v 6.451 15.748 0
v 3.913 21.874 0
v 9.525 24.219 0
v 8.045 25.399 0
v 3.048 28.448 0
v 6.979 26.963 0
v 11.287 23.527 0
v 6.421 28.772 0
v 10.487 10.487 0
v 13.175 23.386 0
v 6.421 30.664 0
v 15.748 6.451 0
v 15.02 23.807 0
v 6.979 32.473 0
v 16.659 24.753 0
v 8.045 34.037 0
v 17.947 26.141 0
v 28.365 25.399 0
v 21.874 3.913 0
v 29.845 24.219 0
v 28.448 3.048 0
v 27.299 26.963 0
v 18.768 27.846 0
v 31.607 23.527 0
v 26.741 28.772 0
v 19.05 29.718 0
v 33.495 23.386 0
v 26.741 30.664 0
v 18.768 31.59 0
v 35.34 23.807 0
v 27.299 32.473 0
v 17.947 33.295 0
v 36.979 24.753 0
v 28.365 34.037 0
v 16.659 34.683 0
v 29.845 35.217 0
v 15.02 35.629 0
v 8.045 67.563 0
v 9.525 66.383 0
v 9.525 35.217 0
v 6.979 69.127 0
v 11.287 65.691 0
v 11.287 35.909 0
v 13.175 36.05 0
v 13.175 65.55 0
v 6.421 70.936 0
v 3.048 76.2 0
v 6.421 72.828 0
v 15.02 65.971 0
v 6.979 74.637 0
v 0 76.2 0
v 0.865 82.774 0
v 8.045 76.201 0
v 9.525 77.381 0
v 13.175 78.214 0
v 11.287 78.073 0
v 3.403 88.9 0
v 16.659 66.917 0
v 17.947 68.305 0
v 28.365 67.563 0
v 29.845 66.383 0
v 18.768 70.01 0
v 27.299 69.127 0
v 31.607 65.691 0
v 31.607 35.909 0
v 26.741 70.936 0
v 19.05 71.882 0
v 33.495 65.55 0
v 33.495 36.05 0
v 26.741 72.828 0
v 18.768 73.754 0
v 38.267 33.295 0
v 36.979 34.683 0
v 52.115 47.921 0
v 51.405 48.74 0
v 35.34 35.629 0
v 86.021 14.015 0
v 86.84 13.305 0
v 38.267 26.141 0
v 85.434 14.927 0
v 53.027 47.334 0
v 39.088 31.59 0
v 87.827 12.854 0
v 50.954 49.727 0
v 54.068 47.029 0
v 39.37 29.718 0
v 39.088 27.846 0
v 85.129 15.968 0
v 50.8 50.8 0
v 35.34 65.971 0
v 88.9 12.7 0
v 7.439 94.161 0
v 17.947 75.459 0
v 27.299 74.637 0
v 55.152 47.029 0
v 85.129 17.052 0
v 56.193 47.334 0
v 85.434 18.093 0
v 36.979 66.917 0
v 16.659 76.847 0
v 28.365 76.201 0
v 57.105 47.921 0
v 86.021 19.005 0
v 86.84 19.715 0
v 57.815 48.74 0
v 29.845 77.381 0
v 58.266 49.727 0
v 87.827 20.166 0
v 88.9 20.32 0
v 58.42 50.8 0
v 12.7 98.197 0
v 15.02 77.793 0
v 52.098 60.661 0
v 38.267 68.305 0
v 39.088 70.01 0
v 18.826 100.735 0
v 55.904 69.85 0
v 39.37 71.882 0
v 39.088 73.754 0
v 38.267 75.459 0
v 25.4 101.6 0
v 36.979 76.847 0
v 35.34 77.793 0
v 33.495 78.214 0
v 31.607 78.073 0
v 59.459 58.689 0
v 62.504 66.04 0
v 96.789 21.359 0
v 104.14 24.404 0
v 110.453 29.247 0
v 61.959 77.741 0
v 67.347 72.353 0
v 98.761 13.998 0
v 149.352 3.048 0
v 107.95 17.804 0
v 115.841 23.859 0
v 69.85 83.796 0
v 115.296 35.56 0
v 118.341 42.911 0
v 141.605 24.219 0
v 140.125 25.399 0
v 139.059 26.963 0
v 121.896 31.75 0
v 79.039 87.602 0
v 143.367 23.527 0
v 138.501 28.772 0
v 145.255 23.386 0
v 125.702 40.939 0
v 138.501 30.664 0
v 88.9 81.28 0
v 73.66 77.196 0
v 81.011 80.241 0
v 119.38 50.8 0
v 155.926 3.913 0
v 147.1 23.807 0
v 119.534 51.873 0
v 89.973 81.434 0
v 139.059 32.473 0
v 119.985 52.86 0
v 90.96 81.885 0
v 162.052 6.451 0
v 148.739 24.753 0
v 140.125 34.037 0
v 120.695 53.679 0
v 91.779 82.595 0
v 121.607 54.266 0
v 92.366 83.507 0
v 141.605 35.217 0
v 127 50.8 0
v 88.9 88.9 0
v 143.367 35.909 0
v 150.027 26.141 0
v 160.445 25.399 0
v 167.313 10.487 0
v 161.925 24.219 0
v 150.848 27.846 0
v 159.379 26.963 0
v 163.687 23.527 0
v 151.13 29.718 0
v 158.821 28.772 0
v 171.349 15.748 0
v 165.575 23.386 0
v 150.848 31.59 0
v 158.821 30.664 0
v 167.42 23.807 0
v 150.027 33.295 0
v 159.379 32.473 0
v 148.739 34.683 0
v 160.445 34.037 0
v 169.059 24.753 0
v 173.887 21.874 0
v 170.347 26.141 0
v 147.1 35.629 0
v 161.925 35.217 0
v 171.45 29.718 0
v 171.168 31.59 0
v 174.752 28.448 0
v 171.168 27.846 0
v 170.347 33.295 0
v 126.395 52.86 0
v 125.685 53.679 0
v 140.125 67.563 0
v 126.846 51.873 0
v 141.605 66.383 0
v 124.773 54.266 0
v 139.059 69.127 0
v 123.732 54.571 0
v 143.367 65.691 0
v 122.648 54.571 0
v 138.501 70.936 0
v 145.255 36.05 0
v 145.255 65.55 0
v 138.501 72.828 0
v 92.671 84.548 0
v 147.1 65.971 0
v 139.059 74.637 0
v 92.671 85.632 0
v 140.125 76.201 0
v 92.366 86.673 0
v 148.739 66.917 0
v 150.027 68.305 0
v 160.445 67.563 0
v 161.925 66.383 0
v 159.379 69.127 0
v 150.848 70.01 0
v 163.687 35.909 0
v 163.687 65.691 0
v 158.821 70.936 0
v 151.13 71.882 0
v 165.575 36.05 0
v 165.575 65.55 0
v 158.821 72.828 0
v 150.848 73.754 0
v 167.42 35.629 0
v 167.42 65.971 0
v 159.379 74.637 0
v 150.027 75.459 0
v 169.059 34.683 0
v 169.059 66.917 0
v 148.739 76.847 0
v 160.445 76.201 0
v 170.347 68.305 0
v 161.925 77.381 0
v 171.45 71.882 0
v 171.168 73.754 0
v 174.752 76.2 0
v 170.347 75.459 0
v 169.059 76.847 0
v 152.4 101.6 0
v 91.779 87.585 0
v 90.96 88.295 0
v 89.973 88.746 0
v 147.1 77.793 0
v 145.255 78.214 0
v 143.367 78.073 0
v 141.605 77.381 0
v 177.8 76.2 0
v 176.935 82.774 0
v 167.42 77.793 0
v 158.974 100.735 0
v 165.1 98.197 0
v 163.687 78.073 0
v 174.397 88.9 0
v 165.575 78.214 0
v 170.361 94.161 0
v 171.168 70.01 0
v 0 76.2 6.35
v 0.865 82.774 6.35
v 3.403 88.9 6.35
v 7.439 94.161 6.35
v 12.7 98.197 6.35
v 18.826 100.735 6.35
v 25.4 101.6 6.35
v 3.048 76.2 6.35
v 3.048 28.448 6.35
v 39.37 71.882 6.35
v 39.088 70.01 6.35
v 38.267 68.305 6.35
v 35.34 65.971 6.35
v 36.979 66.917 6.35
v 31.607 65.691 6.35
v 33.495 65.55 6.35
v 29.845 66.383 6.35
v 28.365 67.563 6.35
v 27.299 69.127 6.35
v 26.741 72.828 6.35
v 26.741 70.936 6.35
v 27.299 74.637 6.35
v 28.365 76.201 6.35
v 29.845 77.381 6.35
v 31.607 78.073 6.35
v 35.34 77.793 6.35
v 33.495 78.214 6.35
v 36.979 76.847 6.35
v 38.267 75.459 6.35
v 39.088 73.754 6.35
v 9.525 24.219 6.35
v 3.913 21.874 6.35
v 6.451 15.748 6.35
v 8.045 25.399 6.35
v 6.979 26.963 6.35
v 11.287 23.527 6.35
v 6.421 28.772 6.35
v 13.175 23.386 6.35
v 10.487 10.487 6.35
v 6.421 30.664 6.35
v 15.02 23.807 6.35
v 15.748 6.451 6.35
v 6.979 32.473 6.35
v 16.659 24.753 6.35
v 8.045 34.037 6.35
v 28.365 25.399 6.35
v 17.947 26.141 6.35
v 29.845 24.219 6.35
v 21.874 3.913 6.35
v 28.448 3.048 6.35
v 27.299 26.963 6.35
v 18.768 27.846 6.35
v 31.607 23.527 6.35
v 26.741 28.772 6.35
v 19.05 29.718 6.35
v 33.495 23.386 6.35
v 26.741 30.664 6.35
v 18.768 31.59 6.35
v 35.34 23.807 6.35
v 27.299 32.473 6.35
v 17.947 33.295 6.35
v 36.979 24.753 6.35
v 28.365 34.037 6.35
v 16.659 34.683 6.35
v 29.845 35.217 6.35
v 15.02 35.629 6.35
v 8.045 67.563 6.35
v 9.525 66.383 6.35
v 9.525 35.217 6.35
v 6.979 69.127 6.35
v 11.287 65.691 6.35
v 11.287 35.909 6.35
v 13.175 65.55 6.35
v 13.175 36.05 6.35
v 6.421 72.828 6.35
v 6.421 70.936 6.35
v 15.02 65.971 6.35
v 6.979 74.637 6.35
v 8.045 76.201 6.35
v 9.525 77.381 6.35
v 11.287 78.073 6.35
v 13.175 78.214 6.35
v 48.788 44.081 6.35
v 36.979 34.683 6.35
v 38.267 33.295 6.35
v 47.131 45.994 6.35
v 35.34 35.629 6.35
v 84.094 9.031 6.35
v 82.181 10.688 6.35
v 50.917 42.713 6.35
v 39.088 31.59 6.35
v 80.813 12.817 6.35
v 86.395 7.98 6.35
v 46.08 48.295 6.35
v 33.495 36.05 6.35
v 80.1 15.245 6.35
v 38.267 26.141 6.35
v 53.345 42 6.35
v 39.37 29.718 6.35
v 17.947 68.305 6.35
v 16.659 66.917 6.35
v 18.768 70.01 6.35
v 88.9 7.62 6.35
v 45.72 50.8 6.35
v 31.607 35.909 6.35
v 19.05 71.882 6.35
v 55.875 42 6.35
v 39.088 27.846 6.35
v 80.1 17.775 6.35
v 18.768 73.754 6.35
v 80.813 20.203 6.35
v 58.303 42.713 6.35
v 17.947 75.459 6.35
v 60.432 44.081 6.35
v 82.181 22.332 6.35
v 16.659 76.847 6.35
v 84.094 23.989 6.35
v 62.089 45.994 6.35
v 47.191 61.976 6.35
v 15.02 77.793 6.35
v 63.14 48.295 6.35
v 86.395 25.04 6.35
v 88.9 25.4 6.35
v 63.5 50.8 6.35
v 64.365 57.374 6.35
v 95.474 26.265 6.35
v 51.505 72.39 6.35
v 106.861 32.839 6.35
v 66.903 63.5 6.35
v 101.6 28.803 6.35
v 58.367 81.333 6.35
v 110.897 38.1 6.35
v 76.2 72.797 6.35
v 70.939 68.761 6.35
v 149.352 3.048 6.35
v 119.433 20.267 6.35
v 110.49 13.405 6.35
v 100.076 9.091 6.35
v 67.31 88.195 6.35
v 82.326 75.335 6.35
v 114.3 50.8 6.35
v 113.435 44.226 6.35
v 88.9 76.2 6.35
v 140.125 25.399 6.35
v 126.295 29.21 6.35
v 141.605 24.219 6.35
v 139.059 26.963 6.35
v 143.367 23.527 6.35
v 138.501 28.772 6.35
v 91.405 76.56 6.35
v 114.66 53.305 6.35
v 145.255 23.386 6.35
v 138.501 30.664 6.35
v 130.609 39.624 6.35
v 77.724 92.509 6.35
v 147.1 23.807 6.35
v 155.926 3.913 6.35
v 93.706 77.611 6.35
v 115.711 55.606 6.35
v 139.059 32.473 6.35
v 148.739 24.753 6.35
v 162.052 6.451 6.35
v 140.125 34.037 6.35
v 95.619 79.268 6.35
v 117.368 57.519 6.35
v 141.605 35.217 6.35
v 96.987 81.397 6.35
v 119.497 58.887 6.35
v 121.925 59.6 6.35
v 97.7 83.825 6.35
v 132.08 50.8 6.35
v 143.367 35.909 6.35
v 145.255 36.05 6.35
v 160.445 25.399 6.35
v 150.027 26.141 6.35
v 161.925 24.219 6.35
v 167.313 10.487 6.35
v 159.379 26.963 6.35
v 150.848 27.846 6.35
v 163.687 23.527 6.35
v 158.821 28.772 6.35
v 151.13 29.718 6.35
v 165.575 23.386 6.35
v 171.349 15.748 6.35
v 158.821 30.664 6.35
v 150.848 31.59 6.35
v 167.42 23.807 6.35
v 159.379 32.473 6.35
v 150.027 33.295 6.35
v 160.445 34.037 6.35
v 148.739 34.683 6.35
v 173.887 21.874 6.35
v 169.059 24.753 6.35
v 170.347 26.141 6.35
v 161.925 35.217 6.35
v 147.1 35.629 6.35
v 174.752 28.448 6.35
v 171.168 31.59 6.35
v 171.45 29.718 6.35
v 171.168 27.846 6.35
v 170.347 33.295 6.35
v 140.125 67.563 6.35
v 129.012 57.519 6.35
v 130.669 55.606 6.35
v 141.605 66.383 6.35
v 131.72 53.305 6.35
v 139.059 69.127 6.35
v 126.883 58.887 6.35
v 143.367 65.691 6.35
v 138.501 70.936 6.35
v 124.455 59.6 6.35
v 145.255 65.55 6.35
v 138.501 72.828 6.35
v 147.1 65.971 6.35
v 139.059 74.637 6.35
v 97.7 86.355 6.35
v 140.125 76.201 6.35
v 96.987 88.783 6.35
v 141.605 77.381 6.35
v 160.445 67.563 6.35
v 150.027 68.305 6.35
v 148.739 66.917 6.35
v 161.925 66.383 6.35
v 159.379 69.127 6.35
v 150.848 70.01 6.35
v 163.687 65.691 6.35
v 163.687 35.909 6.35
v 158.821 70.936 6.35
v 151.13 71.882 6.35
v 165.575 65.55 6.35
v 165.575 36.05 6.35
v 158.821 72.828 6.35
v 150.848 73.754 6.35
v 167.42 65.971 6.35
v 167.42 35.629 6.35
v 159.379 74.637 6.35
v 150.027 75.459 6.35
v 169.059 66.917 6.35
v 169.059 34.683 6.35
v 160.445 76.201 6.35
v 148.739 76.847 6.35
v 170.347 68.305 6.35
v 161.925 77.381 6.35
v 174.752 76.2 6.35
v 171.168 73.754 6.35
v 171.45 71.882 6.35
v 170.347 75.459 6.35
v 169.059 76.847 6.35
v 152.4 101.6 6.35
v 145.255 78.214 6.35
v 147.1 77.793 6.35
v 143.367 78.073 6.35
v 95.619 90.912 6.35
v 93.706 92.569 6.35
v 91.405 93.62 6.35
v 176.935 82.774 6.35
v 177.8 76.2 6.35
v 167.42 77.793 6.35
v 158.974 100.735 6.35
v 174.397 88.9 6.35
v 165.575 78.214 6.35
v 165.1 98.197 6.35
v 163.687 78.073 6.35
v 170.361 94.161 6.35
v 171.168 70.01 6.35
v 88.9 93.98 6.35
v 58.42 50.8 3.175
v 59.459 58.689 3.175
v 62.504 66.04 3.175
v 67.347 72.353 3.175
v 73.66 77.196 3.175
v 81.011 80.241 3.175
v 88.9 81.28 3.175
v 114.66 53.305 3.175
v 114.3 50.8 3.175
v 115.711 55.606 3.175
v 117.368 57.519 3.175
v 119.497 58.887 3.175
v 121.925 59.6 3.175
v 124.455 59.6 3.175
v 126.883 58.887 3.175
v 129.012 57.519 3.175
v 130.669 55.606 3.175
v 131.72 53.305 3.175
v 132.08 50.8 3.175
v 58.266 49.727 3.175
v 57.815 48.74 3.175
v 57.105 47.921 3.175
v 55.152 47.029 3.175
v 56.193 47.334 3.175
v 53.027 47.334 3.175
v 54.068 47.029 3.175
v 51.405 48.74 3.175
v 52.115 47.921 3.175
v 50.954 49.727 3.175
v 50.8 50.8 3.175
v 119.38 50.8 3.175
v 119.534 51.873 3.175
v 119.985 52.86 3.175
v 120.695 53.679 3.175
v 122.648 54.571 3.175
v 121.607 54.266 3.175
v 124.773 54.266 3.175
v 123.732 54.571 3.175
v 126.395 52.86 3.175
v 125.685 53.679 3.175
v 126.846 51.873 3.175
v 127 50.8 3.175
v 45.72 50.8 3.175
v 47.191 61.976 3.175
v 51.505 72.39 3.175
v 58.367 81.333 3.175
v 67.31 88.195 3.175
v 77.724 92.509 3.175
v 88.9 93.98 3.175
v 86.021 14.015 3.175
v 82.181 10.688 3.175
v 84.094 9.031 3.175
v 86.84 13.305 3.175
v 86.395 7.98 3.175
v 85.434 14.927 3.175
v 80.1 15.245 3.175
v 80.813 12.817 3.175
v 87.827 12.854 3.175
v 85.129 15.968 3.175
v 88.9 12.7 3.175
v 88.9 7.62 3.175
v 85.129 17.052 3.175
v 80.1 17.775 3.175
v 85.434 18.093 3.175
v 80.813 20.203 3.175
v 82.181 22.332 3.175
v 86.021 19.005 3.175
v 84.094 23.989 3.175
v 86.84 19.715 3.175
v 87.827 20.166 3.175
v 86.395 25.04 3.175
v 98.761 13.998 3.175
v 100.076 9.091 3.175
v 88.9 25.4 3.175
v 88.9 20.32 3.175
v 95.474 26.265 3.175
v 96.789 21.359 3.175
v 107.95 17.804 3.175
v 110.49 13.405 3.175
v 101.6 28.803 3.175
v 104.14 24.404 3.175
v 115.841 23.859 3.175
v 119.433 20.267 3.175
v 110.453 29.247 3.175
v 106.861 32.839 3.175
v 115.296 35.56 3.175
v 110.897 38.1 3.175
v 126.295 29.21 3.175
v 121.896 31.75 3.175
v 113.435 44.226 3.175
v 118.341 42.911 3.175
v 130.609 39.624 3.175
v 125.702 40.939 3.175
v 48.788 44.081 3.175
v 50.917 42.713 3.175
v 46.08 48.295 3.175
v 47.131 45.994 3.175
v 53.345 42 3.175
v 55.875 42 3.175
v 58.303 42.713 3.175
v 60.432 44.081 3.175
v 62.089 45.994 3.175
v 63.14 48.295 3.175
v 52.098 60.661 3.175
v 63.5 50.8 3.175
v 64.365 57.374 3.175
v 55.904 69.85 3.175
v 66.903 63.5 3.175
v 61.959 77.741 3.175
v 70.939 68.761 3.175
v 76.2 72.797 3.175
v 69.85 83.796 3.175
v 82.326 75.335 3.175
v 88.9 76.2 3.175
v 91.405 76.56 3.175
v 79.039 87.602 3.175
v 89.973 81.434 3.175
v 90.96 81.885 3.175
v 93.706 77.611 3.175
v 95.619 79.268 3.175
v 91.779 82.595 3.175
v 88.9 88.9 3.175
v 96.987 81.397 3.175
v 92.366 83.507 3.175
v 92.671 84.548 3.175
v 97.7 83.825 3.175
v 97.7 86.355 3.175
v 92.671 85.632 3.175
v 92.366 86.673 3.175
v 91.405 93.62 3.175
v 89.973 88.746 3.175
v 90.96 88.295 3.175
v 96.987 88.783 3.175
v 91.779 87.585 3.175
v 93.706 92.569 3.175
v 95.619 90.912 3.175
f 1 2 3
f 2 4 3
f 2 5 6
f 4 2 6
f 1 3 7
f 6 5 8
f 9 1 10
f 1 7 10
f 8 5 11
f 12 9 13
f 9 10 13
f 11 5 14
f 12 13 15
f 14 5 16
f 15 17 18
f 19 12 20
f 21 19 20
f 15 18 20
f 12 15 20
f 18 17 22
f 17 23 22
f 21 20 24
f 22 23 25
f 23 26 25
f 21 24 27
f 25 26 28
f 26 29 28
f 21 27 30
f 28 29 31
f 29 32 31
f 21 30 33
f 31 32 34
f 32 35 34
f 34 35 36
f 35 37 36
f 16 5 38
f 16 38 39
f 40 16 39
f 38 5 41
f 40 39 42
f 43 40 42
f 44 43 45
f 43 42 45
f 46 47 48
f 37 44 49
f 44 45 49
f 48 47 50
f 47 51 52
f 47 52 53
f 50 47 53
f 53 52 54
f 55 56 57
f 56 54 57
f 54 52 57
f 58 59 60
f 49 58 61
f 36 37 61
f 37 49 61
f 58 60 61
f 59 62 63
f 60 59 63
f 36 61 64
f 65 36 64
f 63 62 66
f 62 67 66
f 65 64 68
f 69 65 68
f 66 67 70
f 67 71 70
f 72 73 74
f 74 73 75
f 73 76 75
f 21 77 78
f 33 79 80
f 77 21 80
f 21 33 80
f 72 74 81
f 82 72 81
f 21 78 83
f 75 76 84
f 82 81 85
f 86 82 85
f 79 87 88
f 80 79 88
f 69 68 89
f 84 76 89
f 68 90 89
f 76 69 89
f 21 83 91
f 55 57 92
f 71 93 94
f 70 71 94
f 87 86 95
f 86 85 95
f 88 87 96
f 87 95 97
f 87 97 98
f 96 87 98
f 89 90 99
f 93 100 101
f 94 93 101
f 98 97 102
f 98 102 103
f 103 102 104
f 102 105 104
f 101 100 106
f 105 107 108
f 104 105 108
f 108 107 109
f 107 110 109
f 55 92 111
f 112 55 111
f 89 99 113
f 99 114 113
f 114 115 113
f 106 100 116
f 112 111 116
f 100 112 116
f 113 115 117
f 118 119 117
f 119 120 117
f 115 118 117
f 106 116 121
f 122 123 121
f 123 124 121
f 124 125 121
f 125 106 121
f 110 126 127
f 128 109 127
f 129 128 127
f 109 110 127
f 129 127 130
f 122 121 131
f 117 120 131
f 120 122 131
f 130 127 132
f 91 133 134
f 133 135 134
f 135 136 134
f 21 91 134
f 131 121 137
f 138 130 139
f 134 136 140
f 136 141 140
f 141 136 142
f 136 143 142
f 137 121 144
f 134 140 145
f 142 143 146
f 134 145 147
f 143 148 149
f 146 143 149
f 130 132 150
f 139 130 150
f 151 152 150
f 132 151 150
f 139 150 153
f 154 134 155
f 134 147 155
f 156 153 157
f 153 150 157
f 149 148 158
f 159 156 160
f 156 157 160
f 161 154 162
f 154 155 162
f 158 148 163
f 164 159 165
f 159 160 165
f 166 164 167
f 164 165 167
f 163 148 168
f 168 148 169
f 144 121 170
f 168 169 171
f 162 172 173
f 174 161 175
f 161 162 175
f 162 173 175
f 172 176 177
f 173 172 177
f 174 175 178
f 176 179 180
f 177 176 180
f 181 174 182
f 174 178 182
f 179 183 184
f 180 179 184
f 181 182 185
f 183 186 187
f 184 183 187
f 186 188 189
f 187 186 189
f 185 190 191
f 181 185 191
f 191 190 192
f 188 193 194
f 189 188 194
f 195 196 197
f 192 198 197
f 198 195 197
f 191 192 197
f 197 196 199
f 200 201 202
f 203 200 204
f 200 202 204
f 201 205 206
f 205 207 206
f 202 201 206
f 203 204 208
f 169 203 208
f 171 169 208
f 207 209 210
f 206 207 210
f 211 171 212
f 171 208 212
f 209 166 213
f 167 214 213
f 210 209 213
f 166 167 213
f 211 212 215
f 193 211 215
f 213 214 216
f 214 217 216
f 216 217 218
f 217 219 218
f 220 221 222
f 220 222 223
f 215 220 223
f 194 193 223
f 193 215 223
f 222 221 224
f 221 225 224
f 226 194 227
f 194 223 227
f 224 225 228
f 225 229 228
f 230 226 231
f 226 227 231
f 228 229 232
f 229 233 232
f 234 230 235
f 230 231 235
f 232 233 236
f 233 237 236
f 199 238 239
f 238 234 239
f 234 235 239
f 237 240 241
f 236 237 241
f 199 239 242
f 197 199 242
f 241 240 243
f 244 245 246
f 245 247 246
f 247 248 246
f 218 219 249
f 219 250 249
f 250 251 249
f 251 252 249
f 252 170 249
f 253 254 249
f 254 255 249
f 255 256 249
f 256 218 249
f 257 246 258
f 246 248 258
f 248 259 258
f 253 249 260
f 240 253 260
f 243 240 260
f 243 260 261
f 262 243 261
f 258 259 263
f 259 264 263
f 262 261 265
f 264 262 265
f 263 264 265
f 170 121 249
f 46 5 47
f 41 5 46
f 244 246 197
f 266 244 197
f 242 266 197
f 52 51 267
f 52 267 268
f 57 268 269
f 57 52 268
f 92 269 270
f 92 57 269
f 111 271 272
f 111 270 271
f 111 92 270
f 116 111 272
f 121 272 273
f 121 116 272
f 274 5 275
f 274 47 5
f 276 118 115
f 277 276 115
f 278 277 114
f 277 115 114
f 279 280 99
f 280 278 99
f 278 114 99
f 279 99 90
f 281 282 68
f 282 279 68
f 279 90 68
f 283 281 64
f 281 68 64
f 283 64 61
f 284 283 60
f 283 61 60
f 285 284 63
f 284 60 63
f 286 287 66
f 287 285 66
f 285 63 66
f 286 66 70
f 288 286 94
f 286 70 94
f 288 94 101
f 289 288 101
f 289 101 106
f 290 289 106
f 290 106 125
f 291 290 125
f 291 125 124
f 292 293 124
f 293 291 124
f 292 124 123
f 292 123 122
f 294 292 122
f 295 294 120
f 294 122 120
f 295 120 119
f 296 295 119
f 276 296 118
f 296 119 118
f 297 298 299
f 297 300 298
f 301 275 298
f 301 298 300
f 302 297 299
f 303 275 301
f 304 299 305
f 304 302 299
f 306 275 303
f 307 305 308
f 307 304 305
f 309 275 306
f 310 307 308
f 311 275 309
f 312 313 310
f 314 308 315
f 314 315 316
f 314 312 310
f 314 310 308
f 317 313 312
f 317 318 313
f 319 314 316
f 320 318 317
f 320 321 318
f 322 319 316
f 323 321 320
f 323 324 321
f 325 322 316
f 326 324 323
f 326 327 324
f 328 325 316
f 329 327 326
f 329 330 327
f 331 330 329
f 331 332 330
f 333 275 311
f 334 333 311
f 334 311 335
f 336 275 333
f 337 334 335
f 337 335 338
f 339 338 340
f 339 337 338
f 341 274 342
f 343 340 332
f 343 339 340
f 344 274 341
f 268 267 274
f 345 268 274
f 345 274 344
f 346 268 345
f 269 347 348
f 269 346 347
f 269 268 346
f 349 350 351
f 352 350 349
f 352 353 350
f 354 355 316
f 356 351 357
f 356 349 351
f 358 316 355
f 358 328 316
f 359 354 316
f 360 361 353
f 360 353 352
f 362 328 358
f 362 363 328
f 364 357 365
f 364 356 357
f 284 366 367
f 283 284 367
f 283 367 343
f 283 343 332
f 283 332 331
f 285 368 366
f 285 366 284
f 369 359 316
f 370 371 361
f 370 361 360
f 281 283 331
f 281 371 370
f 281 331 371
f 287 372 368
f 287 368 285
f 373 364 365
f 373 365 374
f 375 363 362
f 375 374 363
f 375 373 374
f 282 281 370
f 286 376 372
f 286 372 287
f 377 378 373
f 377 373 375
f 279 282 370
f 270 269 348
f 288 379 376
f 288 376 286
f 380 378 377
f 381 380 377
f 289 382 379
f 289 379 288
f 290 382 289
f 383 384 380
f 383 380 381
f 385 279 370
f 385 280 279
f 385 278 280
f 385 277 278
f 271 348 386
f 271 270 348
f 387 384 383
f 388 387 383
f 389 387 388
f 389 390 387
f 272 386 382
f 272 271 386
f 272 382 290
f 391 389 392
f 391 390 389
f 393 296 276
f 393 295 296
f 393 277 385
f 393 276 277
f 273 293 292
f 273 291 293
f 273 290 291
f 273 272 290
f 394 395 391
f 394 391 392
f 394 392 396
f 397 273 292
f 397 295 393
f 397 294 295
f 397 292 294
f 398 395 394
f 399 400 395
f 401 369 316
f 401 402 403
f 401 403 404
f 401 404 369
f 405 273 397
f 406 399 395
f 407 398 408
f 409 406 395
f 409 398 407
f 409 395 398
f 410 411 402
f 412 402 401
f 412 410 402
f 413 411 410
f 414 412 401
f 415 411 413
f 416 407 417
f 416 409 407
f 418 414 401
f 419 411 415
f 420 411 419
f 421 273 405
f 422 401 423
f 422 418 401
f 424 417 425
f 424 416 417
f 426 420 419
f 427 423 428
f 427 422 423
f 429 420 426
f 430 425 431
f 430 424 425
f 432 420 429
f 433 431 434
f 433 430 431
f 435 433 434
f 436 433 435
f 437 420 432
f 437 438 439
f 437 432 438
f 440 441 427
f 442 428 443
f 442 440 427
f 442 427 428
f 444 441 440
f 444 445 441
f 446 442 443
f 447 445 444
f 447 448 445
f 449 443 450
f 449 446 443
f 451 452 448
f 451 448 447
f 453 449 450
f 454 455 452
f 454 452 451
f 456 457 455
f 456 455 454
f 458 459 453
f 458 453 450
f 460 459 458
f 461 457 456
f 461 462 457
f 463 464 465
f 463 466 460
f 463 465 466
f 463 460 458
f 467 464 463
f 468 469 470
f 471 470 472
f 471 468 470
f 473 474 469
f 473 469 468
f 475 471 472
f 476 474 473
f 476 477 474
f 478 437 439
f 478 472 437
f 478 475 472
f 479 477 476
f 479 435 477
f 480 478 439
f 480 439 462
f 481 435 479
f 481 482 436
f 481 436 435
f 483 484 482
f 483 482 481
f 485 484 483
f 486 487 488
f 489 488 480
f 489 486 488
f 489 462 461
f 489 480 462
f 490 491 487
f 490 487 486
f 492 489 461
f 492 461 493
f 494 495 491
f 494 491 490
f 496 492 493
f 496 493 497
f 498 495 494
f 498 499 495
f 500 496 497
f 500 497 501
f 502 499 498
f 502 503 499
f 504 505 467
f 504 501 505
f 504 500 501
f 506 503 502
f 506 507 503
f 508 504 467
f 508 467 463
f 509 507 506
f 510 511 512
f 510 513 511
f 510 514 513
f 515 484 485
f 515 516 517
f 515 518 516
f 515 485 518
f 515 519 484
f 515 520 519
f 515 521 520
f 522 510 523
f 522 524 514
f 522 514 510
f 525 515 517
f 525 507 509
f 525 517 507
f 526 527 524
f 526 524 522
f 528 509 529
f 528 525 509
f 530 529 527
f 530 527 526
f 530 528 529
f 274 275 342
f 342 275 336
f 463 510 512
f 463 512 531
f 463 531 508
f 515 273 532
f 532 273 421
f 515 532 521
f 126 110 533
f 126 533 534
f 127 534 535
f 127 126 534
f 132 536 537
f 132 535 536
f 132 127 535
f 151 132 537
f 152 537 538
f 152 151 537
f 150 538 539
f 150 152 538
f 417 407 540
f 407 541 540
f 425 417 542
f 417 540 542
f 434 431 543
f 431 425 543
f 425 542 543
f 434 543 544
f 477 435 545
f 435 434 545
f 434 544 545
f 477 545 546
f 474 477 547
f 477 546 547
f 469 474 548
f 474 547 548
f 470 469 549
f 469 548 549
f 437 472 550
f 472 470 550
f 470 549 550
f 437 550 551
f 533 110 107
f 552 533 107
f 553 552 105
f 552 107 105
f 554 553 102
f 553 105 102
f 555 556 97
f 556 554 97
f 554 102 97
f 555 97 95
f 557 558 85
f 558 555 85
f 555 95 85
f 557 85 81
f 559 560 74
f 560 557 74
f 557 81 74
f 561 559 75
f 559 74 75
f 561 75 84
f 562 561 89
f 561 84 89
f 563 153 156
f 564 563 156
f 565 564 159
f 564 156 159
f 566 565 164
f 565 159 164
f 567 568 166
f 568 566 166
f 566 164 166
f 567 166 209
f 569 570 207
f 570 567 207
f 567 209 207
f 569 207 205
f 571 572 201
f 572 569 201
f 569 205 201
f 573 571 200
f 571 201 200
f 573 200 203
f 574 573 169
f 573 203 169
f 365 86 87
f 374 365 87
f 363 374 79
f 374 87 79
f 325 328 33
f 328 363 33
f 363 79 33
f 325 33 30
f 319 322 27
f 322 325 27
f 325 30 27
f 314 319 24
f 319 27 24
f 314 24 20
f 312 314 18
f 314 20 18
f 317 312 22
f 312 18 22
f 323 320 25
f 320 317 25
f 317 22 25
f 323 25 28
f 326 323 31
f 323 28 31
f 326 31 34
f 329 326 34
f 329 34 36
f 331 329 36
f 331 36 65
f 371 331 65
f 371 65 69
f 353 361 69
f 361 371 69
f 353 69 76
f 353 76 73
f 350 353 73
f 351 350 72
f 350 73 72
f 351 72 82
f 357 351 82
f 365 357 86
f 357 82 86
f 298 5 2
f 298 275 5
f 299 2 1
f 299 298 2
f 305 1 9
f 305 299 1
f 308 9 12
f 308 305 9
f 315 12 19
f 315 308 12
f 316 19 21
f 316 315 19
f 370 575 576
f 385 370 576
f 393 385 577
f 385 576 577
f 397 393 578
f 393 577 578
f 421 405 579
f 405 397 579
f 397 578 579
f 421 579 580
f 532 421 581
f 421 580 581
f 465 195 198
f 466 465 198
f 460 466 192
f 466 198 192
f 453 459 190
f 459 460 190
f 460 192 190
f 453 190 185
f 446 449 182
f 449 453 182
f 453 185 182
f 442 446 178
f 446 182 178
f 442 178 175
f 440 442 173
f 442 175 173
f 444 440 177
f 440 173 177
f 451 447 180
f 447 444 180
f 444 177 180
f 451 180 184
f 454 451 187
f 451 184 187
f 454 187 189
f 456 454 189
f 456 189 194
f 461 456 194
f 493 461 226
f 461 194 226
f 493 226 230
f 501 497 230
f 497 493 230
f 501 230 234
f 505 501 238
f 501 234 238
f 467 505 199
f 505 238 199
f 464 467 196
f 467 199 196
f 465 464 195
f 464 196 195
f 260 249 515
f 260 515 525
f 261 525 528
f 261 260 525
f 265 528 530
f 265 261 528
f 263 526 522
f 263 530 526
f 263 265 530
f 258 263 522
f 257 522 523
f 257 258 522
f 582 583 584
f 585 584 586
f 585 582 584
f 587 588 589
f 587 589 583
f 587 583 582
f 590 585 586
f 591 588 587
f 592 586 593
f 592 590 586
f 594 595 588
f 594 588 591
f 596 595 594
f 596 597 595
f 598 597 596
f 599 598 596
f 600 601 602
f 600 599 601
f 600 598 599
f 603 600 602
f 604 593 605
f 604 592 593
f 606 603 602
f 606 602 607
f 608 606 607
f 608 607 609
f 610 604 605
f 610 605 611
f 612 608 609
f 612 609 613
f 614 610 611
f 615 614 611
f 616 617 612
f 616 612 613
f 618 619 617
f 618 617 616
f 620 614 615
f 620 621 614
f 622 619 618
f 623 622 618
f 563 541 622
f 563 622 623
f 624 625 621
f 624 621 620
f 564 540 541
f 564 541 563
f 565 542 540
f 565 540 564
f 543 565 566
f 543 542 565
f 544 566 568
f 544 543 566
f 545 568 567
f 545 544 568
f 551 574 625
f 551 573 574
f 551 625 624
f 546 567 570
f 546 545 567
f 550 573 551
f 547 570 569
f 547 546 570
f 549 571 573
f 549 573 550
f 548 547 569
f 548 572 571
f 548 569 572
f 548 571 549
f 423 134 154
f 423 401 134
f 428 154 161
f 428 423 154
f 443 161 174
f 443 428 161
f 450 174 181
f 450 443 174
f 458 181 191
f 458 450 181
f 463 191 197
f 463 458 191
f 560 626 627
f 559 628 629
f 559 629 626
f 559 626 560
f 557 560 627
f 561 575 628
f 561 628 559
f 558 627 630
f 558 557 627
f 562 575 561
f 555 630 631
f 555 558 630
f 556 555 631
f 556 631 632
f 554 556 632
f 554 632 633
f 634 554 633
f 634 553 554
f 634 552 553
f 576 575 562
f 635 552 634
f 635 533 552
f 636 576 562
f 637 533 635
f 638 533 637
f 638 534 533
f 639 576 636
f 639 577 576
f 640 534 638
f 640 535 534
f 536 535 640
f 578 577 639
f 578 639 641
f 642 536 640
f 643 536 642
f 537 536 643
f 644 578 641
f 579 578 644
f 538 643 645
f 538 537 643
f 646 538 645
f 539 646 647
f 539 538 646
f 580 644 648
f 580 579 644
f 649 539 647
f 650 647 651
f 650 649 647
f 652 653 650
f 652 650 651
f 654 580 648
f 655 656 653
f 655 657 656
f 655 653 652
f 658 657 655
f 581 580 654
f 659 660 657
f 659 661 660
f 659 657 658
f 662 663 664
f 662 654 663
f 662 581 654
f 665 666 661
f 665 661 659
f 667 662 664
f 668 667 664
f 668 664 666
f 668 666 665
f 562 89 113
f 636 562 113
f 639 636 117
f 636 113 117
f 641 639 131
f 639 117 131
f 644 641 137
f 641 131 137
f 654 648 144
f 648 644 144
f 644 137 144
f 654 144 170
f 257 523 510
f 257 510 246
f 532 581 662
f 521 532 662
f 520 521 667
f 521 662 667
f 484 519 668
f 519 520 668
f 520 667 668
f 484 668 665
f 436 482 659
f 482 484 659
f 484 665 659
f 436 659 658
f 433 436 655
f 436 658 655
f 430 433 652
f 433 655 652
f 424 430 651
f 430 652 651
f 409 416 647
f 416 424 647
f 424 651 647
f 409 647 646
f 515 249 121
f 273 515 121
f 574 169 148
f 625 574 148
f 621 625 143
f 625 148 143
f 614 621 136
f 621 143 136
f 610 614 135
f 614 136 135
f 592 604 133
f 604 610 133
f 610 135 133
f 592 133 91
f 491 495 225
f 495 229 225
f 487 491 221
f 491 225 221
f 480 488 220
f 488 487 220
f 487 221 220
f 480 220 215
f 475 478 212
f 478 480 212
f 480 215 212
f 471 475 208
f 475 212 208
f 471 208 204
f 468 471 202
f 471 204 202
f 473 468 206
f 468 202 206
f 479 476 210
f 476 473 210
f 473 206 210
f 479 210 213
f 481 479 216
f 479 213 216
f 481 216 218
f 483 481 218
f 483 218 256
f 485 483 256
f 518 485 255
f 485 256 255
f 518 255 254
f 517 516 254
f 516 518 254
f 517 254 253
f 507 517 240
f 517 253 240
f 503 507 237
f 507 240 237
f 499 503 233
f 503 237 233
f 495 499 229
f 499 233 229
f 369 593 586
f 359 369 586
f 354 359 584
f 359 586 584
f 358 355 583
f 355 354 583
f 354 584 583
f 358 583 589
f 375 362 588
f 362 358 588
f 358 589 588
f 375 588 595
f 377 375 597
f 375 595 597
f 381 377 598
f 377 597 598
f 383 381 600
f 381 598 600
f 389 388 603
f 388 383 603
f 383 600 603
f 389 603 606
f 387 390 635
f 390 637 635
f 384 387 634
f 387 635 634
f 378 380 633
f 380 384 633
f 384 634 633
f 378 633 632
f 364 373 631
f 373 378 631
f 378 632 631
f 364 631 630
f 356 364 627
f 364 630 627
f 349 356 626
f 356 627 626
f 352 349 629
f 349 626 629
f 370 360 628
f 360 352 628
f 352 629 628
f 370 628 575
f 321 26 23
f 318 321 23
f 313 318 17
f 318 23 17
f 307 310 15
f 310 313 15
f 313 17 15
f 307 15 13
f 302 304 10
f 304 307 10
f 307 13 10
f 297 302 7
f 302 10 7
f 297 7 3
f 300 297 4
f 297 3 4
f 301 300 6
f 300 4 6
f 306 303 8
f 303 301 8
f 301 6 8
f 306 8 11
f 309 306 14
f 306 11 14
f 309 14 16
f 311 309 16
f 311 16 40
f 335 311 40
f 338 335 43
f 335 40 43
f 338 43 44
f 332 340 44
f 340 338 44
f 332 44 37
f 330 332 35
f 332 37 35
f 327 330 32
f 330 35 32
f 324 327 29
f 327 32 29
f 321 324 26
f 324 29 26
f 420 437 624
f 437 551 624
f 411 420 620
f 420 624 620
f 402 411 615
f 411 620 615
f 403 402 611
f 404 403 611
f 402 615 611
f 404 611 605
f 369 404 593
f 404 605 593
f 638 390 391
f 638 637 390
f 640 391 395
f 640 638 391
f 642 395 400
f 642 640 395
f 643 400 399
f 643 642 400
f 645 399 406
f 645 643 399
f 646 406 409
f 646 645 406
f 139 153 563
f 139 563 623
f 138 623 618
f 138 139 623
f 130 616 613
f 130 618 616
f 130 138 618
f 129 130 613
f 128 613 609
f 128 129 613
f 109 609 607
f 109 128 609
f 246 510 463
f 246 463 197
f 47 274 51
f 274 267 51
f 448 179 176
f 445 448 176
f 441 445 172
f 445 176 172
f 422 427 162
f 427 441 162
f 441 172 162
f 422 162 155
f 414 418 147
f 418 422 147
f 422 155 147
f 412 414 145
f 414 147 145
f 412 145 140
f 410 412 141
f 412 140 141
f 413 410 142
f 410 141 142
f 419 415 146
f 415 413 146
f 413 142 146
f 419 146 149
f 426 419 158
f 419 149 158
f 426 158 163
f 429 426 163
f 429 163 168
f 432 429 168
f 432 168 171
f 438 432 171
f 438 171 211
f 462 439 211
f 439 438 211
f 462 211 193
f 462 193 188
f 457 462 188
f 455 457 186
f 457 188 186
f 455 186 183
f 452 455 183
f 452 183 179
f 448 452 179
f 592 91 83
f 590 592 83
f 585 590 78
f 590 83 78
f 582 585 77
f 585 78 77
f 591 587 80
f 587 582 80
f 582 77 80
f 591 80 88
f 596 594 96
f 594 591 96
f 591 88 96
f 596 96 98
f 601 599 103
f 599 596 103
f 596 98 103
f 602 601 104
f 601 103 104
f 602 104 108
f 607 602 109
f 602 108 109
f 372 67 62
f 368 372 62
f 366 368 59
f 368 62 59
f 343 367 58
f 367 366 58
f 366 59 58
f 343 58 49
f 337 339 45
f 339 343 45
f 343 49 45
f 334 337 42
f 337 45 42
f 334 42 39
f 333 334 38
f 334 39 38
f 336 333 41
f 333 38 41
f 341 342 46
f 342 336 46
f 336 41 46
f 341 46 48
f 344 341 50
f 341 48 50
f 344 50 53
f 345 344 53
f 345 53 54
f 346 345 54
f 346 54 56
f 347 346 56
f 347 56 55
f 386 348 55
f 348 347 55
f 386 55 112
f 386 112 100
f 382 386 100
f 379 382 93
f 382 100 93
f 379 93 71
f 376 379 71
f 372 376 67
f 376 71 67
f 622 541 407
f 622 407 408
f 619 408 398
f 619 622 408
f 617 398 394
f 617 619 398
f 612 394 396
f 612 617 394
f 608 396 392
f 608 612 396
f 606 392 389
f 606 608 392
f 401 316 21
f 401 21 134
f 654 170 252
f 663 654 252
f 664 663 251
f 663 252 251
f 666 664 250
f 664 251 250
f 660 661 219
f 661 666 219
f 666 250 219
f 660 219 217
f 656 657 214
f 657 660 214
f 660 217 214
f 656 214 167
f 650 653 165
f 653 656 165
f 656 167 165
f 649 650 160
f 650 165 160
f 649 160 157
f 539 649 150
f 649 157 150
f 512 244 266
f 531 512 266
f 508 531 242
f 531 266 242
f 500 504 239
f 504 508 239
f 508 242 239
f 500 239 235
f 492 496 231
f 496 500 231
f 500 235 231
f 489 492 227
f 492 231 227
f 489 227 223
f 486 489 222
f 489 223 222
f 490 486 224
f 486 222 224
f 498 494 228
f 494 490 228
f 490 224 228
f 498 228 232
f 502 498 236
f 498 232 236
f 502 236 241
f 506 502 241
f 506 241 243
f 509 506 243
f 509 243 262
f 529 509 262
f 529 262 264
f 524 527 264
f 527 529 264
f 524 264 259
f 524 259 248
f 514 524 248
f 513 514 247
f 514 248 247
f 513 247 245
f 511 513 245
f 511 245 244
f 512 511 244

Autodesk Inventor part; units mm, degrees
ref_plane "YZ Plane" through (0, 0, 0) normal (1, 0, 0) x (0, 1, 0)
ref_plane "XZ Plane" through (0, 0, 0) normal (0, 1, 0) x (-1, 0, 0)
ref_plane "XY Plane" through (0, 0, 0) normal (0, 0, 1) x (1, 0, 0)
sketch "Sketch1" plane through (0, 0, 0) normal (0, 0, 1) x (1, 0, 0)
  line L0 (0, 0) -> (177.8, 0)
  line L1 (177.8, 0) -> (177.8, 101.6)
  line L2 (177.8, 101.6) -> (0, 101.6)
  line L3 (0, 101.6) -> (0, 0)
  arc A0 (25.4, 101.6) -> (0, 76.2) centre (25.4, 76.2) ccw
  arc A1 (177.8, 76.2) -> (152.4, 101.6) centre (152.4, 76.2) ccw
  arc A2 (152.4, 0) -> (177.8, 25.4) centre (152.4, 25.4) ccw
  arc A3 (0, 25.4) -> (25.4, 0) centre (25.4, 25.4) ccw
  arc A4 (88.9, 85.09) -> (54.61, 50.8) centre (88.9, 50.8) ccw construction
  arc A5 (88.9, 88.9) -> (50.8, 50.8) centre (88.9, 50.8) ccw
  arc A6 (88.9, 81.28) -> (58.42, 50.8) centre (88.9, 50.8) ccw
  arc A7 (88.9, 81.28) -> (88.9, 88.9) centre (88.9, 85.09) ccw
  arc A8 (50.8, 50.8) -> (58.42, 50.8) centre (54.61, 50.8) ccw
  line L4 (88.9, 50.8) -> (54.61, 50.8) construction
  line L5 (88.9, 50.8) -> (88.9, 85.09) construction
  arc A9 (88.9, 20.32) -> (119.38, 50.8) centre (88.9, 50.8) ccw
  line L6 (88.9, 50.8) -> (123.19, 50.8) construction
  arc A10 (88.9, 16.51) -> (123.19, 50.8) centre (88.9, 50.8) ccw construction
  arc A11 (127, 50.8) -> (119.38, 50.8) centre (123.19, 50.8) ccw
  arc A12 (88.9, 12.7) -> (127, 50.8) centre (88.9, 50.8) ccw
  arc A13 (88.9, 20.32) -> (88.9, 12.7) centre (88.9, 16.51) ccw
  line L7 (0, 50.8) -> (177.8, 50.8)
  line L8 (88.9, 101.6) -> (88.9, 0)
  circle A14 centre (12.7, 71.882) radius 6.35
  circle A15 centre (33.02, 71.882) radius 6.35
  circle A16 centre (12.7, 29.718) radius 6.35
  circle A17 centre (33.02, 29.718) radius 6.35
  circle A18 centre (165.1, 29.718) radius 6.35
  circle A19 centre (144.78, 29.718) radius 6.35
  circle A20 centre (165.1, 71.882) radius 6.35
  circle A21 centre (144.78, 71.882) radius 6.35
  point P0 (0, 0)
  point P1 (0, 0)
  point P2 (-19.4884, -65.4138)
  dimension "d2" = 177.8
  dimension "d3" = 101.6
  dimension "d4" = 50.8
  dimension "d5" = 50.8
  dimension "d6" = 50.8
  dimension "d7" = 50.8
  dimension "d9" = 50.8
  dimension "d10" = 88.9
  dimension "d11" = 34.29
  dimension "d12" = 90
  dimension "d13" = 7.62
  dimension "d14" = 360
  dimension "d15" = 0
  dimension "d16" = 0
  dimension "d17" = 0
  dimension "d19" = 0
  dimension "d20" = 12.7
  dimension "d21" = 12.7
  dimension "d22" = 20.32
  dimension "d24" = 21.082
  dimension "d25" = 12.7
extrude "Extrusion1" add sketch "Sketch1" along normal blind 3.175 contours A3 L3 L7 A8 L8 A13 L0 | L8 A12 L7 L1 A2 L0 | L3 A0 L2 L8 A5 L7 | A11 L7 L8 A7 L2 A1 L1 | L8 L7 A9 | A6 L8 L7
sketch "Sketch2" plane through (0, 0, 3.175) normal (0, 0, 1) x (1, 0, 0)
  line L0 (0, 0) -> (177.8, 0)
  line L1 (177.8, 0) -> (177.8, 101.6)
  line L2 (177.8, 101.6) -> (0, 101.6)
  line L3 (0, 101.6) -> (0, 0)
  circle A0 centre (12.7, 71.882) radius 6.35
  circle A1 centre (12.7, 71.882) radius 6.35 projected
  circle A2 centre (33.02, 71.882) radius 6.35
  circle A3 centre (12.7, 29.718) radius 6.35
  circle A4 centre (33.02, 29.718) radius 6.35
  circle A5 centre (33.02, 71.882) radius 6.35 projected
  circle A6 centre (12.7, 29.718) radius 6.35 projected
  circle A7 centre (33.02, 29.718) radius 6.35 projected
  circle A8 centre (144.78, 71.882) radius 6.35
  circle A9 centre (144.78, 29.718) radius 6.35
  circle A10 centre (165.1, 71.882) radius 6.35
  circle A11 centre (165.1, 29.718) radius 6.35
  circle A12 centre (144.78, 71.882) radius 6.35 projected
  circle A13 centre (165.1, 71.882) radius 6.35 projected
  circle A14 centre (144.78, 29.718) radius 6.35 projected
  circle A15 centre (165.1, 29.718) radius 6.35 projected
  arc A16 (88.9, 85.09) -> (54.61, 50.8) centre (88.9, 50.8) ccw construction
  arc A17 (88.9, 93.98) -> (45.72, 50.8) centre (88.9, 50.8) ccw
  arc A18 (88.9, 76.2) -> (63.5, 50.8) centre (88.9, 50.8) ccw
  arc A19 (88.9, 76.2) -> (88.9, 93.98) centre (88.9, 85.09) ccw
  arc A20 (45.72, 50.8) -> (63.5, 50.8) centre (54.61, 50.8) ccw
  line L4 (88.9, 50.8) -> (54.61, 50.8) construction
  line L5 (88.9, 50.8) -> (88.9, 85.09) construction
  arc A21 (88.9, 25.4) -> (114.3, 50.8) centre (88.9, 50.8) ccw
  line L6 (88.9, 50.8) -> (123.19, 50.8) construction
  arc A22 (88.9, 16.51) -> (123.19, 50.8) centre (88.9, 50.8) ccw construction
  arc A23 (88.9, 7.62) -> (132.08, 50.8) centre (88.9, 50.8) ccw
  arc A24 (132.08, 50.8) -> (114.3, 50.8) centre (123.19, 50.8) ccw
  arc A25 (88.9, 25.4) -> (88.9, 7.62) centre (88.9, 16.51) ccw
  arc A26 (25.4, 101.6) -> (0, 76.2) centre (25.4, 76.2) ccw
  arc A27 (0, 25.4) -> (25.4, 0) centre (25.4, 25.4) ccw
  line L7 (177.8, 25.4) -> (177.8, 76.2) projected
  arc A28 (152.4, 0) -> (177.8, 25.4) centre (152.4, 25.4) ccw
  arc A29 (129.8378, 37.0665) -> (128.016, 32.512) centre (152.4, 25.4) ccw
  arc A30 (177.8, 76.2) -> (152.4, 101.6) centre (152.4, 76.2) ccw
  arc A31 (177.8, 76.2) -> (152.4, 101.6) centre (152.4, 76.2) ccw projected
  dimension "d28" = 177.8
  dimension "d29" = 101.6
  dimension "d30" = 12.7
  dimension "d31" = 12.7
  dimension "d32" = 12.7
  dimension "d33" = 12.7
  dimension "d34" = 12.7
  dimension "d35" = 12.7
  dimension "d36" = 12.7
  dimension "d37" = 12.7
  dimension "d38" = 34.29
  dimension "d39" = 90
  dimension "d40" = 17.78
  dimension "d41" = 50.8
  dimension "d42" = 88.9
  dimension "d45" = 360
  dimension "d48" = 25.4
  dimension "d49" = 50.8
  dimension "d57" = 50.8
extrude "Extrusion2" add sketch "Sketch2" along normal blind 3.175 contours A27 L3 A26 L2 A30 L1 A28 L0
sketch "Sketch3" plane through (177.8, 25.4, 0) normal (1, 0, 0) x (0, 0, -1)
  line L0 (-6.35, 0) -> (-6.35, 50.8) projected
  line L1 (-6.35, 50.8) -> (0, 50.8)
  line L2 (0, 50.8) -> (0, -25.4)
  line L3 (0, -25.4) -> (-6.35, -25.4)
  line L4 (-6.35, -25.4) -> (-6.35, 50.8)
extrude "Extrusion3" cut sketch "Sketch3" against normal blind 3.048
sketch "Sketch4" plane through (0, 25.4, 0) normal (-1, 0, 0) x (0, 0, 1)
  line L0 (6.35, 50.8) -> (0, 50.8) projected
  line L1 (6.35, -25.4) -> (6.35, 0) projected
  line L2 (0, 50.8) -> (6.35, 50.8)
  line L3 (6.35, 50.8) -> (6.35, -25.4)
  line L4 (6.35, -25.4) -> (0, -25.4)
  line L5 (0, -25.4) -> (0, 50.8)
  point P0 (0, -25.4)
extrude "Extrusion4" cut sketch "Sketch4" against normal blind 3.048
sketch "Sketch5" plane through (25.4, 0, 0) normal (0, -1, 0) x (1, 0, 0)
  line L0 (-22.352, 6.35) -> (-22.352, 0) projected
  line L1 (149.352, 6.35) -> (149.352, 0) projected
  line L2 (-22.352, 6.35) -> (149.352, 6.35)
  line L3 (149.352, 6.35) -> (149.352, 0)
  line L4 (149.352, 0) -> (-22.352, 0)
  line L5 (-22.352, 0) -> (-22.352, 6.35)
  point P0 (-25.4, 0)
extrude "Extrusion5" cut sketch "Sketch5" against normal blind 3.048
sketch "Sketch6" plane through (0, 0, 6.35) normal (0, 0, 1) x (1, 0, 0)
  arc A0 (3.048, 28.448) -> (28.448, 3.048) centre (28.448, 28.448) ccw
  arc A1 (149.352, 3.048) -> (174.752, 28.448) centre (149.352, 28.448) ccw
  line L0 (3.048, 76.2) -> (3.048, 13.3357) projected
  line L1 (13.3357, 3.048) -> (164.4643, 3.048) projected
  line L2 (174.752, 13.3357) -> (174.752, 76.2) projected
  line L3 (3.048, 28.448) -> (3.048, 3.048)
  line L4 (3.048, 3.048) -> (28.448, 3.048)
  line L5 (174.752, 28.448) -> (174.752, 3.048)
  line L6 (149.352, 3.048) -> (174.752, 3.048)
  point P0 (0, 0)
  point P1 (3.048, 13.3357)
  dimension "d66" = 50.8
  dimension "d67" = 50.8
extrude "Extrusion6" cut sketch "Sketch6" against normal through all
properties part number "Back_plate"
